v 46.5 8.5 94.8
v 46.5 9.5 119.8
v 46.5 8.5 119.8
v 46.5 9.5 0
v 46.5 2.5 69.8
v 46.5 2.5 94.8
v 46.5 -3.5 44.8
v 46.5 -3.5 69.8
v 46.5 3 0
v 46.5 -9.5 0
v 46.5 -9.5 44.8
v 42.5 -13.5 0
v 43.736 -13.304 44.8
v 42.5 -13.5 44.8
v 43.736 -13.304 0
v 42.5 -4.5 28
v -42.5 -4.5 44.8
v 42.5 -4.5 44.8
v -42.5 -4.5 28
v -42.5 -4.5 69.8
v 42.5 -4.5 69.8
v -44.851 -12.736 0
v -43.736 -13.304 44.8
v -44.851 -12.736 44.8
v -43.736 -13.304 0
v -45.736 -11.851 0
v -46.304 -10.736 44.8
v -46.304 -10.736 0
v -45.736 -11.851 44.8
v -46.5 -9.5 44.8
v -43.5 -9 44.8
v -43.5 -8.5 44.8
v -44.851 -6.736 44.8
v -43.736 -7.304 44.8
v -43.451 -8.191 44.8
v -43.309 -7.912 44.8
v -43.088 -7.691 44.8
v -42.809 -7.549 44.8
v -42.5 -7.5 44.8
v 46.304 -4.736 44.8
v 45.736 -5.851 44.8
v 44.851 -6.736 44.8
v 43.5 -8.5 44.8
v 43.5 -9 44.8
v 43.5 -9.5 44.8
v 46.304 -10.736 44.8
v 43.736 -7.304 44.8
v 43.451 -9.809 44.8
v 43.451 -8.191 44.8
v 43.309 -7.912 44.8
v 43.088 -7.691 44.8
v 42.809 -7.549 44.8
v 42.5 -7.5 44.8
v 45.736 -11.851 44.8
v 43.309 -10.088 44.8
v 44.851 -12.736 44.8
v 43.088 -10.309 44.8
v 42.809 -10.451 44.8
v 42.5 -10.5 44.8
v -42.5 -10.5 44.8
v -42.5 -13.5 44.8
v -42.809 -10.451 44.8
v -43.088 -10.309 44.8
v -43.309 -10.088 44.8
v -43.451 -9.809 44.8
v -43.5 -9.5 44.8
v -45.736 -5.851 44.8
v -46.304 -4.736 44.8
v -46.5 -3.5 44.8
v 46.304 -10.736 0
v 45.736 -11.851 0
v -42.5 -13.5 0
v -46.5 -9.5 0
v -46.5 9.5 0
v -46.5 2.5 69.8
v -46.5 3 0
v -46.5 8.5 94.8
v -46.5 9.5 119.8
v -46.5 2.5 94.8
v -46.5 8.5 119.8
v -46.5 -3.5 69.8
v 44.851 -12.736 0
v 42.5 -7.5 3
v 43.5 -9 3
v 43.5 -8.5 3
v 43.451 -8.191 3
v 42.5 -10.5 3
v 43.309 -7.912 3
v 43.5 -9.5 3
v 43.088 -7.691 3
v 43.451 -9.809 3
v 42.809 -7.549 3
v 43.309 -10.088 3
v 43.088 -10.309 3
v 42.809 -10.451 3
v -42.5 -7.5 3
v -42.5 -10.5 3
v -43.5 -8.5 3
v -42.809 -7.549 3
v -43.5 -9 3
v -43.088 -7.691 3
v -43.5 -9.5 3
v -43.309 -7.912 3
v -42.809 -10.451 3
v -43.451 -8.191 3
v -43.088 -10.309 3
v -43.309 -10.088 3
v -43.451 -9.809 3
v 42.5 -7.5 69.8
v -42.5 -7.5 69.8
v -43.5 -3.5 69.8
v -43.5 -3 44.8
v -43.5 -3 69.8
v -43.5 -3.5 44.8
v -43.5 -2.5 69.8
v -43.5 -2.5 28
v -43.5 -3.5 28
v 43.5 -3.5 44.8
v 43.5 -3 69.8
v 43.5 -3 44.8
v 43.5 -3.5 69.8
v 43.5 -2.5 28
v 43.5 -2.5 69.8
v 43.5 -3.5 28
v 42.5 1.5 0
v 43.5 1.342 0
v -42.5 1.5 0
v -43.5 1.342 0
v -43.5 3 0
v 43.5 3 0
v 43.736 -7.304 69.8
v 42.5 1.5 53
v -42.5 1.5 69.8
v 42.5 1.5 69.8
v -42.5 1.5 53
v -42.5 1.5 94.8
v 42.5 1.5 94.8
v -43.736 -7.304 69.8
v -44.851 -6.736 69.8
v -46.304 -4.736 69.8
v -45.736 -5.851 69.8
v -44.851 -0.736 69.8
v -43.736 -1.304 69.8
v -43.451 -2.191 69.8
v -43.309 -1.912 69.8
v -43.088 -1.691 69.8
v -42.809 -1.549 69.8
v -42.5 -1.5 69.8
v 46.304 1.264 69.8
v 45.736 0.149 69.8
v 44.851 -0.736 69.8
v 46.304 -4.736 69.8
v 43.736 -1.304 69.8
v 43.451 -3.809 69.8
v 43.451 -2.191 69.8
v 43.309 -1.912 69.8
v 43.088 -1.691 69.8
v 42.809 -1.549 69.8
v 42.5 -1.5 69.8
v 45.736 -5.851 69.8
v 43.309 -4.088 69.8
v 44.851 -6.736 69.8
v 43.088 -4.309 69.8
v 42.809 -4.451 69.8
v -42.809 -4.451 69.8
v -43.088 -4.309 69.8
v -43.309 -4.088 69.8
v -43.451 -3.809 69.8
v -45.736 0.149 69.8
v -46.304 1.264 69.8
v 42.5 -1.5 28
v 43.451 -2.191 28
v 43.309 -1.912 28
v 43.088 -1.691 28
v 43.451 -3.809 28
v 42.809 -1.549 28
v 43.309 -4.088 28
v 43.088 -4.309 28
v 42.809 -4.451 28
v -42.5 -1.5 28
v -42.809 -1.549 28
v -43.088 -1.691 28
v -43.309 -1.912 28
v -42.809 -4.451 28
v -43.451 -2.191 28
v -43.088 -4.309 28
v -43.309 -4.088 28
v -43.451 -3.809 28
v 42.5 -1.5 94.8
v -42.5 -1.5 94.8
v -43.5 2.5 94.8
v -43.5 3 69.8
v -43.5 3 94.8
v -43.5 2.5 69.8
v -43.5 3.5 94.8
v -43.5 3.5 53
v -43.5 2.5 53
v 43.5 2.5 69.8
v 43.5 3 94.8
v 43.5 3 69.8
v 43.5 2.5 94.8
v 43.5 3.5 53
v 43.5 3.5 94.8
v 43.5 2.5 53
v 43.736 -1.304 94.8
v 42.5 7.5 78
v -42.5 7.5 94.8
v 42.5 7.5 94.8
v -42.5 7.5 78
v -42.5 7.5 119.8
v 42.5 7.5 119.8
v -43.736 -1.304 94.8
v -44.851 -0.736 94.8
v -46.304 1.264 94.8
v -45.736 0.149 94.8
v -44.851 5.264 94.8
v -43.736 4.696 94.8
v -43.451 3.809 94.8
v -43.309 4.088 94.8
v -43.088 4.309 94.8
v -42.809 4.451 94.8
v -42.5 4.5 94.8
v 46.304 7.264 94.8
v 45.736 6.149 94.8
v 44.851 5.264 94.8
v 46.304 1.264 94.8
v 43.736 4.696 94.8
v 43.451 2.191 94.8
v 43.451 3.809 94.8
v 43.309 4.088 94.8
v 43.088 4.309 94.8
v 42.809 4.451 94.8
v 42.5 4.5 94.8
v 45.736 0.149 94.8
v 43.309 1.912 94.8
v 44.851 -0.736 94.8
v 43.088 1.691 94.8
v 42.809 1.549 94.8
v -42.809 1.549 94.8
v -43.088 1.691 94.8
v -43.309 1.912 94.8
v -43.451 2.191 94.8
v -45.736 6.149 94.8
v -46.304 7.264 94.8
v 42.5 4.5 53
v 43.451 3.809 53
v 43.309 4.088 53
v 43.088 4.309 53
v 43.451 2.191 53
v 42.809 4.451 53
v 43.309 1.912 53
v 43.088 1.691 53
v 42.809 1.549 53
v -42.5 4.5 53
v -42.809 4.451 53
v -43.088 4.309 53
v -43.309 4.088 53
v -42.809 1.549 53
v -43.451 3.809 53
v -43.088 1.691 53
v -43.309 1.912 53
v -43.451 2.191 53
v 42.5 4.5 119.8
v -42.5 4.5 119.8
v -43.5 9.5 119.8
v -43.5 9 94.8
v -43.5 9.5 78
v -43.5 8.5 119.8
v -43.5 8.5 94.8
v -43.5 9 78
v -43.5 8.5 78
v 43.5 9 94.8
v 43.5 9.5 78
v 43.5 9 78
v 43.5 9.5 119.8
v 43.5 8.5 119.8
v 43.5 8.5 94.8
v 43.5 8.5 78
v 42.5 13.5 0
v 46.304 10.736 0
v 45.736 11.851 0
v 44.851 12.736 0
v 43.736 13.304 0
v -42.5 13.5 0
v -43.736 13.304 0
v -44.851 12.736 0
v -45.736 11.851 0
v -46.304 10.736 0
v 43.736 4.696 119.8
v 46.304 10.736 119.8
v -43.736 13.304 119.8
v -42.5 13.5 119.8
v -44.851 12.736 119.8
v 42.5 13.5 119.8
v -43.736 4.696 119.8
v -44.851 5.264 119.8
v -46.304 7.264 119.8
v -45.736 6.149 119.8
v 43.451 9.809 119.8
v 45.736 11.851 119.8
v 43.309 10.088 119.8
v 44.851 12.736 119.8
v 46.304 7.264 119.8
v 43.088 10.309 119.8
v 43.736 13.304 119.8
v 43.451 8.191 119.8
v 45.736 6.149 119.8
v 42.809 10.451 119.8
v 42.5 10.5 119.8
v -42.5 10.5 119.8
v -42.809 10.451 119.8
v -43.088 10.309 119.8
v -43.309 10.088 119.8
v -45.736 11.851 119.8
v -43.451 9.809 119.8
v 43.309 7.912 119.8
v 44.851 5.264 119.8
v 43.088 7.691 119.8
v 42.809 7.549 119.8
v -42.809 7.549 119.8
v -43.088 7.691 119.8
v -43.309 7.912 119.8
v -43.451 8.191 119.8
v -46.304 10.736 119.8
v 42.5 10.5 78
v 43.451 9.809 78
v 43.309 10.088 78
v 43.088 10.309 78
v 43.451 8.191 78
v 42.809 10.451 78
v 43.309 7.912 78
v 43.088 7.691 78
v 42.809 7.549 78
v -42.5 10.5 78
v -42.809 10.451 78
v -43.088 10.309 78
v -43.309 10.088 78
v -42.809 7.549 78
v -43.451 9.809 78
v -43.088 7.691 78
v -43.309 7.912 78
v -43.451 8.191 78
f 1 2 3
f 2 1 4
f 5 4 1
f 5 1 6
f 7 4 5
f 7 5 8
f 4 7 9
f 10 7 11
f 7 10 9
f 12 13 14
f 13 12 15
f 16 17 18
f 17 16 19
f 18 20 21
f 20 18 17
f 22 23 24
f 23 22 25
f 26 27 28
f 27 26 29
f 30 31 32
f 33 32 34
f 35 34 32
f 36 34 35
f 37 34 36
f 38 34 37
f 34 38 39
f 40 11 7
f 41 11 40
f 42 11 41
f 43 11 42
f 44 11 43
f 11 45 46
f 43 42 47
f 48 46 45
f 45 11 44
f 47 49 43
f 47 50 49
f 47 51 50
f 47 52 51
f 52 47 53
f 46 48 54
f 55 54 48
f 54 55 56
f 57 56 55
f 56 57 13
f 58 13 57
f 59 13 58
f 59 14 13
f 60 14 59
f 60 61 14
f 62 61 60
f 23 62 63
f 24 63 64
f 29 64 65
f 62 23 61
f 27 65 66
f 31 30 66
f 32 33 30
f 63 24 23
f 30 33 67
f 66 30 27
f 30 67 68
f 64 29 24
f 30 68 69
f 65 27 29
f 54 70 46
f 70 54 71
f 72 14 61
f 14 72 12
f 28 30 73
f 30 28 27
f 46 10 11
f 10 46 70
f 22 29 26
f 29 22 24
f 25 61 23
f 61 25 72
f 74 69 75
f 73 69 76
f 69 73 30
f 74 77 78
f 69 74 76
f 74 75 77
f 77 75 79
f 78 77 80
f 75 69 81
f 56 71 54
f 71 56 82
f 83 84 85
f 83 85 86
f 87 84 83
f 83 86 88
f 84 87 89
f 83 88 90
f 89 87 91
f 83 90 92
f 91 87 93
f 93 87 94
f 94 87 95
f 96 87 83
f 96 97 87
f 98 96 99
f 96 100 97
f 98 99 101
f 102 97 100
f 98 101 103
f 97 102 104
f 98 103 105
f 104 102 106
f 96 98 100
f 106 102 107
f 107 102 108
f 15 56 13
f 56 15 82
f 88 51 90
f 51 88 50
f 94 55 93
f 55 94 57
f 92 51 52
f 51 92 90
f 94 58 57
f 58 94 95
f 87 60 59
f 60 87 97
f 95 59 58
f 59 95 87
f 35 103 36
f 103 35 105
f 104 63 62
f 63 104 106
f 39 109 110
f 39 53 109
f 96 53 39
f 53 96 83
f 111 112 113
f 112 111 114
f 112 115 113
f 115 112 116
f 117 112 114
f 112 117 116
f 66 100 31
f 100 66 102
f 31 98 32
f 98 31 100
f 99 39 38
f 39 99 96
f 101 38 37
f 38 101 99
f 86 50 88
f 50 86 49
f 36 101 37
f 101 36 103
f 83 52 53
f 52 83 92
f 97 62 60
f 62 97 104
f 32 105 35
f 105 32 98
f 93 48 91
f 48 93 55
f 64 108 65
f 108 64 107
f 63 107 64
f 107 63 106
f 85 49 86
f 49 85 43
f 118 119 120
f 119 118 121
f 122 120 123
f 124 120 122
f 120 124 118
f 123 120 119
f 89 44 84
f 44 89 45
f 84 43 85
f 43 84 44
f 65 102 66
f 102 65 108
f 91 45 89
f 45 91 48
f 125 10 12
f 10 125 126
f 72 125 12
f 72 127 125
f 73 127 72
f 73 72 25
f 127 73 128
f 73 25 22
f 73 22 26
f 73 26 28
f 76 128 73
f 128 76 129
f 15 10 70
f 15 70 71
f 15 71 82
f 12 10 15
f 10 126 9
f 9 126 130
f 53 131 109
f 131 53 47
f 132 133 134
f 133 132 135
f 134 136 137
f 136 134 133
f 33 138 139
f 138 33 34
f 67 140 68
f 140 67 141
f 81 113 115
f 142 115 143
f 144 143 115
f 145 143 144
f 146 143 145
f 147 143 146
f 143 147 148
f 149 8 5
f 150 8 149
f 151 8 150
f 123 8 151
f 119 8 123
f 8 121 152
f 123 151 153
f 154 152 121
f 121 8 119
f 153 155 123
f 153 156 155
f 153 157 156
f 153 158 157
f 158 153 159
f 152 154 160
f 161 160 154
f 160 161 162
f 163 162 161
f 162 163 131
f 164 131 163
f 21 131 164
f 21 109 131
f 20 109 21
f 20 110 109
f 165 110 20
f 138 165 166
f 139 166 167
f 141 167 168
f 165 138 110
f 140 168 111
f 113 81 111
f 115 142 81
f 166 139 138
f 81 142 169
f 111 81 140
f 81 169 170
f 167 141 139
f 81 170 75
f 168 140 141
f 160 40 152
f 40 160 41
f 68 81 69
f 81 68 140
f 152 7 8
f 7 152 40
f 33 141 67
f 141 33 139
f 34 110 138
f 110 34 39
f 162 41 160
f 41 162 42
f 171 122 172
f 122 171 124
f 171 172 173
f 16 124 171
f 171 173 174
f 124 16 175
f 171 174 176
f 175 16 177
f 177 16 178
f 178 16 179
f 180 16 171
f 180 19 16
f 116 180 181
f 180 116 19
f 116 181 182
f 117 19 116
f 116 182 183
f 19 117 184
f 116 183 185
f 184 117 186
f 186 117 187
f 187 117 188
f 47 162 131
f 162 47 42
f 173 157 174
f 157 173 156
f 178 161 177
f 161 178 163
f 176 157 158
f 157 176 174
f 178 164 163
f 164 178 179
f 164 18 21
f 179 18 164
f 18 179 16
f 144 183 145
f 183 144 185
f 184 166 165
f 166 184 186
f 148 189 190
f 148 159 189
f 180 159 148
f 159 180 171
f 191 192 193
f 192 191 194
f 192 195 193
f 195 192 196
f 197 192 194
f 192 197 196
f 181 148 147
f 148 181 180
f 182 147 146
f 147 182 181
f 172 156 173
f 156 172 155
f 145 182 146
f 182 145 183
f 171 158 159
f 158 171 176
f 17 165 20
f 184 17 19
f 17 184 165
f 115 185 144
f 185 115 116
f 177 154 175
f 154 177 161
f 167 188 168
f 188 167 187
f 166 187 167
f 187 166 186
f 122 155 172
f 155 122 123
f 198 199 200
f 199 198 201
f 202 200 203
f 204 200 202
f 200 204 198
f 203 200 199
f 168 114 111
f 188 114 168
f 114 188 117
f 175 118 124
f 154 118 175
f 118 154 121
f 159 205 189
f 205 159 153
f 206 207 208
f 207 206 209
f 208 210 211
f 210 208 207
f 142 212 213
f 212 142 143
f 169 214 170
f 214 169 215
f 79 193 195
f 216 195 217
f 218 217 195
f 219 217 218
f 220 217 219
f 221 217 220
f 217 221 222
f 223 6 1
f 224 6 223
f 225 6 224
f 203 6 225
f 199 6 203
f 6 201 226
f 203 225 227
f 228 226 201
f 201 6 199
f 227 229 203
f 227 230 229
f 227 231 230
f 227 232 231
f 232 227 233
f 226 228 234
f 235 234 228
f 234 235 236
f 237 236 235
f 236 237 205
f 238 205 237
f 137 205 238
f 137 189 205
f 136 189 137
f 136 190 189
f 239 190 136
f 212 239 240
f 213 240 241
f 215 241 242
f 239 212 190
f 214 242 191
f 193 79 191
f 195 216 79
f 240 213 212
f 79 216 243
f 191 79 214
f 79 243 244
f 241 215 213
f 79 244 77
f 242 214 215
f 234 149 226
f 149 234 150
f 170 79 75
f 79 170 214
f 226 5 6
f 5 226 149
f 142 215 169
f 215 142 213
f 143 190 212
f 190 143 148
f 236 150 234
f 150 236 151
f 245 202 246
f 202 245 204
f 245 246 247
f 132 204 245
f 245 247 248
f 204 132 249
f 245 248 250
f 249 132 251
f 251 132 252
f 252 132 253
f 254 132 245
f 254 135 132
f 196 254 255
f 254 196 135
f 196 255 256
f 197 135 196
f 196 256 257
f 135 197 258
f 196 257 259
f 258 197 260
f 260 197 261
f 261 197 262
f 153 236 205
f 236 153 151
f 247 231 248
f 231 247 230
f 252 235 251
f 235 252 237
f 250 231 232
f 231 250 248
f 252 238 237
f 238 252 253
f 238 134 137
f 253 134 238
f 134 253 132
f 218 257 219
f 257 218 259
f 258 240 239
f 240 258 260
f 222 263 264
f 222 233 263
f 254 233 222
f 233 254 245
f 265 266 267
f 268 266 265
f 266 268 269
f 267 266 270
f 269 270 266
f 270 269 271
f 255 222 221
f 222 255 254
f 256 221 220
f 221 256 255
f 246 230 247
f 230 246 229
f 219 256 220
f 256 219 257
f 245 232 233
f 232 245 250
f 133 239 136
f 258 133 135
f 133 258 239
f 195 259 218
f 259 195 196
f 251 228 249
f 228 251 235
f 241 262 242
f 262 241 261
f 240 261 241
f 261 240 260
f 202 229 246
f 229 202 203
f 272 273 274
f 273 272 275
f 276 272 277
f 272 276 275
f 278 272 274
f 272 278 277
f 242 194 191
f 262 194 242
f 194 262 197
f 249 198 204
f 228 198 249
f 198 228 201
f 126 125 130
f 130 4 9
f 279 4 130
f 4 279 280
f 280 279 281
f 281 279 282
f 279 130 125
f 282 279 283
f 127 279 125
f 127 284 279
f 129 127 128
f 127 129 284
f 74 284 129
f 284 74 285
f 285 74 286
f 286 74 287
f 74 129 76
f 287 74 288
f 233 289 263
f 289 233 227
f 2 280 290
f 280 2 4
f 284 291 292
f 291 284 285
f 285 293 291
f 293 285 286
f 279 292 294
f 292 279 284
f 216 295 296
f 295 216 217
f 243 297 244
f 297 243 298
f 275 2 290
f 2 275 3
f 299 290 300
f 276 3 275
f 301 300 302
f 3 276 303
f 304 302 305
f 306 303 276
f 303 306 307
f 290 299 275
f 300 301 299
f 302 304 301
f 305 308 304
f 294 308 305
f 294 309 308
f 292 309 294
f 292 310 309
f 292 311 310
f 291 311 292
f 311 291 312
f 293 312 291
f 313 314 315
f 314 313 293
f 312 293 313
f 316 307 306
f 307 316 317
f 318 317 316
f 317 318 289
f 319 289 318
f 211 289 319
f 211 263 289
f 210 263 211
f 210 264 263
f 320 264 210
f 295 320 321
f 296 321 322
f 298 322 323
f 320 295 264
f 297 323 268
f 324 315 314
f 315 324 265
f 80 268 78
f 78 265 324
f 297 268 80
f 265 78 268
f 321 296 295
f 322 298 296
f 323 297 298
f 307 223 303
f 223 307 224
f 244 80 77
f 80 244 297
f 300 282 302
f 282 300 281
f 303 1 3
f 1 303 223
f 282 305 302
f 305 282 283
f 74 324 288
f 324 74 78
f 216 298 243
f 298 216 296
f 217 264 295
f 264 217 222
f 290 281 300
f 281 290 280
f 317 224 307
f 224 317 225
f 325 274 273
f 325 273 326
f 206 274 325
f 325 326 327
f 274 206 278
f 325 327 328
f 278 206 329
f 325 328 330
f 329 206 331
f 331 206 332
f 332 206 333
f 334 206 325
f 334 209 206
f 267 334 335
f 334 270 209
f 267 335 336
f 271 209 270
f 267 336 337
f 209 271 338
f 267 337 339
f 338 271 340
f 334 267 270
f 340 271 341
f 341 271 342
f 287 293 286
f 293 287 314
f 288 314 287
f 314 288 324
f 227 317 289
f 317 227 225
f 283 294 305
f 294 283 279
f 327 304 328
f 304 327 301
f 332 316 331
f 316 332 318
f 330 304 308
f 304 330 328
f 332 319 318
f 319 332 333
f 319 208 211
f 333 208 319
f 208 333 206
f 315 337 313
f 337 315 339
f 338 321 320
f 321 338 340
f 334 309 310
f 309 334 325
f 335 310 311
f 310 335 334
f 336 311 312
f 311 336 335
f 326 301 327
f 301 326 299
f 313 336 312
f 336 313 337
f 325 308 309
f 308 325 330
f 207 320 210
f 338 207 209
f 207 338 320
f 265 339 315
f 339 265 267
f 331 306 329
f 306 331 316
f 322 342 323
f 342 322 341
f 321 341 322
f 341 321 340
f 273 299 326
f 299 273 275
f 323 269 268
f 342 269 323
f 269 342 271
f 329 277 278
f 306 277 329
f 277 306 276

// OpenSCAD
/* https://edux.fit.cvut.cz/courses/BI-3DT/classification/openscad-ukol */
/* https://github.com/nesro/nesrotom-3dt-2015 */
/* nesrotom@fit.cvut.cz */

/* comment this out before submission! */
$fn = 20;

/************************************************************/

/* rounded cube - 4 cylinder + hull */
module rc4CH(x,y,z,r) {
    echo("rc4CH x=",x,",\ty=",y,",\tz=",z,",\tr=",r);
    //%cube([x+2*r,y+2*r,z], center=true);
    hull() {
        for (i=[-1,1])
            for (j=[-1,1])
                translate([(i*x/2),(j*y/2),0]) 
                    cylinder(r=r, h=z, center=true);
    }
}

/* rounded cube - linear extrude */
module rcLE(x,y,z,r) {
    echo("rcSOE x=",x,",\ty=",y,",\tz=",z,",\tr=",r);
    //%cube([x+2*r,y+2*r,z], center=true);
    linear_extrude(height=z,center=true,convexity=0,twist=0)
    offset(r=+r)
    square([x,y],center=true);
}

module rc(x,y,z,r) { 
    if (y == 0) {
        rc4CH(x,y,z,r);
    } else {
        rcLE(x,y,z,r);
    }
}

/************************************************************/

module one_card(x,y,z,t,s,c,d,v,i) {
    c_height = y*(1-v); /* one card height */
    ch_height = c_height + 2*s; /* one card holder height */
    bottom_offset = 0 - (ch_height / 2) - (t / 2);
    
    side_y = z + t + 2 * s;
    
    /* posun podle poradi karty a tak, aby 1 karta zacinala na
       y 0 */
    to_side = (i * (t + s + s + z)) + ((side_y + t)/2);
    to_up = 0 + (i * d);
    translate([0,
        to_side, //y
        (ch_height / 2) + t + s - to_up //z
    ]) {
 
        difference() {
            rc(x, z, ch_height + 2*s, t + s);
            rc(x, z, ch_height + 2*s, s);
        }
        
        color("red")
        translate([0, 0, bottom_offset - s + (to_up / 2)])
            rc(x, z, t - to_up, t + s);
        
        /* postrani kostky, aby hrany nebyli kulaty */
        //side_cube_height =
        delta_side = -(i * d);
        
        if (i < c - 1) {
        color("green")
        for (mp = [-1, 1]) /* mp = minus 1, plus 1 */
            //translate([i * (x/2 - y/2), 0, -(z / 2) + (y / 2)])
            translate([
                    mp * ((x/2) + s + t/2), //x
                    side_y/2,//-(z/2 + s + t)/2 , //y
                    -t/2 -(delta_side / 2) ])
                cube([
                    t,
                    side_y, //2*(z/2 + s) + 1,
                    ch_height + 2*s + t + delta_side
                ], center=true);
        }
    }
}

module draw_cardholder(x,y,z,t,s,c,d,v) {
    
    if (d >= 0) {
        translate([0,
            -(((c * (t + s + z + s)) + t) / 2)
        ,0])
        for (i=[1:c]) {
            one_card(x,y,z,t,s,c,d,v, i - 1);
        }
    } else {
        translate([0,
            -(((c * (t + s + z + s)) + t) / 2)
        ,0])
        for (i=[1:c]) {
            one_card(x,y,z,t,s,c,d,v, i - 1);
        }
    }   
}

/************************************************************/


module cardholder(
    size=[85, 54, 1],
    thickness=3,
    spacing=1,
    cards=4,
    delta=25,
    visibility=0.3)
{
    draw = (len(size) < 2 || size[0] <= 0 ||
            size[1] <= 0 || cards <= 0) ? false : true;
    visibility = (visibility < 0) ? 0 : (1 < visibility) ? 1 : visibility;
    thickness = (thickness < 0) ? 0 : thickness;
    spacing = (spacing < 0) ? 0 : spacing;
    size = len(size) == 2 ? concat(size, 0) : size;
    
    echo("draw",draw,"visibility",visibility,"thickness",thickness,
        "spacing",spacing,"size",size);
    
    /* i need shortcuts because i have a small screen */
    x = size[0];
    y = size[1];
    z = size[2];   
    s = spacing;
    t = thickness;
    c = cards;
    d = -delta;
    v = visibility;
    
    if (draw) {
        draw_cardholder(x,y,z,t,s,c,d,v);
    }
}

/************************************************************/
/* TESTS ****************************************************/
/************************************************************/

test_no = 1;

if (test_no == 1) {
    cardholder();
    echo("TEST #1: edux default <<<<<");
}

if (test_no == 2) {
    cardholder(size=[85, 54, 1], thickness=3, spacing=1, cards=4, delta=25, visibility=0.3);
    echo("TEST #2: edux default copied <<<<<");
}

if (test_no == 3) {
    cardholder(size=[90, 70, 4], thickness=3, spacing=1, cards=4, delta=25, visibility=0.3);
    echo("TEST #3: edux slightly different size <<<<<");
}

if (test_no == 300) {
    cardholder(size=[900, 700, 40], thickness=30, spacing=10, cards=4, delta=2500, visibility=0.3);
    echo("TEST #3: edux slightly different size <<<<<");
}


if (test_no == 4) {
    cardholder(size=[90, 70, 4], thickness=5, spacing=3, cards=6, delta=10, visibility=0.5);
    echo("TEST #4: edux slightly different size and rest <<<<<");
}

if (test_no == 5) {
    cardholder(size=[666], thickness=3, spacing=1, cards=4, delta=25, visibility=0.3);
    echo("TEST #5: vector has only 1 item <<<<<");
    echo("TEST #5: NOTHIG SHALL BE GENERATED! <<<<<");
}

if (test_no == 6) {
    cardholder(size=[85, 54], thickness=3, spacing=1, cards=4, delta=25, visibility=0.3);
    echo("TEST #6: vector has only 2 item <<<<<");
}

if (test_no == 7) {
    cardholder(size=[0, 54, 1], thickness=3, spacing=1, cards=4, delta=25, visibility=0.3);
    echo("TEST #7: size[0] == 0 <<<<<");
    echo("TEST #7: NOTHIG SHALL BE GENERATED! <<<<<");
}

if (test_no == 8) {
    cardholder(size=[85, 0, 1], thickness=3, spacing=1, cards=4, delta=25, visibility=0.3);
    echo("TEST #8: size[1] == 0 <<<<<");
    echo("TEST #8: NOTHIG SHALL BE GENERATED! <<<<<");
}

if (test_no == 9) {
    cardholder(size=[85, 54, 1], thickness=3, spacing=1, cards=0, delta=25, visibility=0.3);
    echo("TEST #9: cards == 0 <<<<<");
    echo("TEST #9: NOTHIG SHALL BE GENERATED! <<<<<");
}

if (test_no == 10) {
    cardholder(size=[85, 54, 10], thickness=30, spacing=-3, cards=1, delta=25, visibility=0.3);
    echo("TEST #10: spacing < 0 <<<<<");
}

if (test_no == 11) {
    cardholder(size=[85, 54, 1], thickness=3, spacing=1, cards=4, delta=0, visibility=0.3);
    echo("TEST #11: delta == 0 <<<<<");
}

if (test_no == 12) {
    cardholder(size=[85, 54, 1], thickness=3, spacing=1, cards=4, delta=-25, visibility=0.3);
    echo("TEST #12: delta = -delta <<<<<");
}

if (test_no == 13) {
    cardholder(size=[85, 54, 1], thickness=3, spacing=1, cards=4, delta=25, visibility=-2);
    echo("TEST #13: visibility = -2 <<<<<");
}

if (test_no == 14) {
    cardholder(size=[85, 54, 1], thickness=3, spacing=1, cards=4, delta=25, visibility=2);
    echo("TEST #14: visibility = 2 <<<<<");
}

if (test_no == 15) {
    cardholder(size=[85, 54, 1], thickness=3, spacing=1, cards=1, delta=25, visibility=0.3);
    echo("TEST #15: only 1 card <<<<<");
}

if (test_no == 16) {
    cardholder(size=[85, 54, 1], thickness=3, spacing=1, cards=10, delta=25, visibility=0.3);
    echo("TEST #16: 10 cards <<<<<");
}

if (test_no == 17) {
    cardholder(size=[85, 54, 1], thickness=3, spacing=1, cards=50, delta=25, visibility=0.3);
    echo("TEST #17: 50 cards <<<<<");
}

if (test_no == 18) {
    cardholder(size=[85, 54, 1], thickness=3, spacing=1, cards=2, delta=25, visibility=0.3);
    echo("TEST #18: 2 cards <<<<<");
}

    
    
    
